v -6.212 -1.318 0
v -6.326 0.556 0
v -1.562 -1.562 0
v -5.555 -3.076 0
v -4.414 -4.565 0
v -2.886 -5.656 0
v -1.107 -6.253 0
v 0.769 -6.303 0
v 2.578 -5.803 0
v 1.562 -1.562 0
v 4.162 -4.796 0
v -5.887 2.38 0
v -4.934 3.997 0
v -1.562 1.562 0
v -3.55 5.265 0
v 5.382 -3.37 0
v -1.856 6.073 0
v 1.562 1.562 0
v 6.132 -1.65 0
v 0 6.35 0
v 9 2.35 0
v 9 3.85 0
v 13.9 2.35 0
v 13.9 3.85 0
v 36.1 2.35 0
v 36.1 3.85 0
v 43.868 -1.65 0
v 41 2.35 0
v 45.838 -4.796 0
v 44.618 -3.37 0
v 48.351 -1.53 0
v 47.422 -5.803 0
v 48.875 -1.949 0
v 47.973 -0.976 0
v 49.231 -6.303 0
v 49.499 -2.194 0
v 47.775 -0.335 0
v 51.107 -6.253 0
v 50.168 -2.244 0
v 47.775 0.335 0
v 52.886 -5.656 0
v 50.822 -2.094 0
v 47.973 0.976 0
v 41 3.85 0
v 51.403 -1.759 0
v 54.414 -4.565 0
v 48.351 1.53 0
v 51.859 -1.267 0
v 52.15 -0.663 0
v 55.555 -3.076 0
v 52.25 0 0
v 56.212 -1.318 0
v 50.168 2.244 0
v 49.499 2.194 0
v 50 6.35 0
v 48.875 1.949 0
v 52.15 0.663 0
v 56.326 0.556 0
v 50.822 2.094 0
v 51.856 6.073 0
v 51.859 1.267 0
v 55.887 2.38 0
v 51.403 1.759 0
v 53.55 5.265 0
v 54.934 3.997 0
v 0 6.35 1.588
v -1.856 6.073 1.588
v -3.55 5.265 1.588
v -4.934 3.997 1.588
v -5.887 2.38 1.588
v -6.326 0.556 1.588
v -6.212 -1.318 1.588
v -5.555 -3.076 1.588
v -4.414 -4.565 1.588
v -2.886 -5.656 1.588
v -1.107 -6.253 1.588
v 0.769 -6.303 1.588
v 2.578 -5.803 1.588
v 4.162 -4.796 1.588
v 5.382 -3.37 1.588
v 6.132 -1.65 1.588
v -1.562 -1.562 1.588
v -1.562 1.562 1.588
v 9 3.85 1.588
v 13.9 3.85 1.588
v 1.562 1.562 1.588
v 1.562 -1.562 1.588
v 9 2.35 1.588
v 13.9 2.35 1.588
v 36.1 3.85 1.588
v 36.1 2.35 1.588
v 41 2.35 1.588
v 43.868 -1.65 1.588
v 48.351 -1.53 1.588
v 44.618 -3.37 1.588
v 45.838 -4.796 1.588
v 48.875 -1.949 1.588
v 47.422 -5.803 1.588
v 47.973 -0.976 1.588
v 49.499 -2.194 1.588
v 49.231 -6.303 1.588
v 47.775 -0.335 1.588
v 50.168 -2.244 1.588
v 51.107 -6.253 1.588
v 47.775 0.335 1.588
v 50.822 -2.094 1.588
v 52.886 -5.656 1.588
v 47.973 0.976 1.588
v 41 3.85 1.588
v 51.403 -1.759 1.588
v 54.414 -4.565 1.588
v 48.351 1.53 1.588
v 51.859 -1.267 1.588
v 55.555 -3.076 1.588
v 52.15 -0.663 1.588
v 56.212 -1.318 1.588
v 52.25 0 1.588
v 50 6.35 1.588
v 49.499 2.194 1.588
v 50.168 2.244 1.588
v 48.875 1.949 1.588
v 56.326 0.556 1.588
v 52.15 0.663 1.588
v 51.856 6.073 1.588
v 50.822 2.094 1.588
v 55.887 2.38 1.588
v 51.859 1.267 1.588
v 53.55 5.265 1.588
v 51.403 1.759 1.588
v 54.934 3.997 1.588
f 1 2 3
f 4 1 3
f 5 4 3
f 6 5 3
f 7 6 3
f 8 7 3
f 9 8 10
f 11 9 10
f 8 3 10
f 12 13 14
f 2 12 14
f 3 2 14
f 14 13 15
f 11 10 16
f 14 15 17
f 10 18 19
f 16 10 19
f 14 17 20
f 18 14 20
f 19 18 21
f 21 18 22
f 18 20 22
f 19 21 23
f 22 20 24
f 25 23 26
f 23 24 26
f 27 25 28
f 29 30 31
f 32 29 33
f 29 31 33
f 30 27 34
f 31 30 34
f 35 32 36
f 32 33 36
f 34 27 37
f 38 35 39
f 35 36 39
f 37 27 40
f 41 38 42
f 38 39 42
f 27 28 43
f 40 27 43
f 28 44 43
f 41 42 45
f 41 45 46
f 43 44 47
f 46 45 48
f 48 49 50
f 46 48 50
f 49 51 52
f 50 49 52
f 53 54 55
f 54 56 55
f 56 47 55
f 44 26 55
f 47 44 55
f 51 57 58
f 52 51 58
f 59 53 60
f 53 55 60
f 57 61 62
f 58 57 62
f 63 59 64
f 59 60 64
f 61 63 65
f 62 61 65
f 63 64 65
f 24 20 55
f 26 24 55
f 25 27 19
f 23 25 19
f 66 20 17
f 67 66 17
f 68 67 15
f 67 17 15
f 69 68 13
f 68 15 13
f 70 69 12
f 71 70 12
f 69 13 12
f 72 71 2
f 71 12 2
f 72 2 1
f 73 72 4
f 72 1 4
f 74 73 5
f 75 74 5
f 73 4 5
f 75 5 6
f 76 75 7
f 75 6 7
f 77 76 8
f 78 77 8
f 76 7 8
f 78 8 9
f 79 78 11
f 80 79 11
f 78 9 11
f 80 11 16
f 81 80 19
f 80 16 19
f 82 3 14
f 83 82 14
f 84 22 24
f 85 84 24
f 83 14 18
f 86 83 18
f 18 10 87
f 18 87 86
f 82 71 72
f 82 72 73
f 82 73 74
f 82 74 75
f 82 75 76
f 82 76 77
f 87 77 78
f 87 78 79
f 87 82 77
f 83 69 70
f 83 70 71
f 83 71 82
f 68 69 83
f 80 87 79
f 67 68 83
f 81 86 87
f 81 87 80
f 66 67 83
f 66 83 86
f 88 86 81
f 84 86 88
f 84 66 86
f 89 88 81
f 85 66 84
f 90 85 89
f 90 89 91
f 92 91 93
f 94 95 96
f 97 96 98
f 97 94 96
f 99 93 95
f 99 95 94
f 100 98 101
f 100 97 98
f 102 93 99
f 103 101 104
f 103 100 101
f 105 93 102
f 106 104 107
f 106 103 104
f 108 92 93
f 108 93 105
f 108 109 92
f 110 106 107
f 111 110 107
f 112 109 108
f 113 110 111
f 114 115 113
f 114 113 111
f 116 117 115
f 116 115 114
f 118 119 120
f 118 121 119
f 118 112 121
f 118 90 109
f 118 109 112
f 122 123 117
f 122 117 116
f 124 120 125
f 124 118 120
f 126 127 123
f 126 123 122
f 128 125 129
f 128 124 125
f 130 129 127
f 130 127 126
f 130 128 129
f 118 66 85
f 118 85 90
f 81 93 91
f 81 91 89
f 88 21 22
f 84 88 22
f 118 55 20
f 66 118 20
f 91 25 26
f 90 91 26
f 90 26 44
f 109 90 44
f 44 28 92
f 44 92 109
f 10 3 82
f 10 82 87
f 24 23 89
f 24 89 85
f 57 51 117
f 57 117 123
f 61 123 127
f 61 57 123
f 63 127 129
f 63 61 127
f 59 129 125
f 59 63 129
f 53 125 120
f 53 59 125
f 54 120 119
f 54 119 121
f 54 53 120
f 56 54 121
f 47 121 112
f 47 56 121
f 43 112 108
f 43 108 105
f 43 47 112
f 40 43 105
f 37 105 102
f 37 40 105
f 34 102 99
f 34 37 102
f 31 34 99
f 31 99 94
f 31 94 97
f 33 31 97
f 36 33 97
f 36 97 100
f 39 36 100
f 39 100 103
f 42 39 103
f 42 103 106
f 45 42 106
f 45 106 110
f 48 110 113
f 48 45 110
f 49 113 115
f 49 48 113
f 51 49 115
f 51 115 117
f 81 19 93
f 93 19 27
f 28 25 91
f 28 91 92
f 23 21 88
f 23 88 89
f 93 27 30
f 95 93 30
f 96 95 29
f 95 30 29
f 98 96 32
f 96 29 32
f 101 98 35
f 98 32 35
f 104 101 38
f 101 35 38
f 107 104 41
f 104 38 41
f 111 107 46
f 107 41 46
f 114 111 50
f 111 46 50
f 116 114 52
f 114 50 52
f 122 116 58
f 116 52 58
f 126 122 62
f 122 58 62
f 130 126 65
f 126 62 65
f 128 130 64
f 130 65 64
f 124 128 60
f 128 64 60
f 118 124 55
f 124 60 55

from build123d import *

# Parameters (mm, degrees)
SKETCH1_W           = 4.9
SKETCH1_H           = 1.5
SKETCH1_R           = 6.35
SKETCH1_W_2         = 3.125
SKETCH1_H_2         = 3.125
SKETCH1_R_2         = 2.25
BOSS_EXTRUDE1_DEPTH = 1.5875


with BuildPart() as part:
    # Sketch1 → Boss-Extrude1 (new body)
    # profile 1 of 3: a face of its own
    with BuildSketch(Plane.XY):
        with BuildLine():
            Line((50, 6.35), (0, 6.35))
            ThreePointArc((0, 6.35), (4.490128061, 4.490128061), (6.35, 0))
            ThreePointArc((6.35, 0), (6.295234812, -0.83217706), (6.131883887, -1.65))
            Line((6.131883887, -1.65), (43.868116113, -1.65))
            ThreePointArc((43.868116113, -1.65), (44.960158733, 3.862965182), (50, 6.35))
        make_face()
        with Locations((11.45, 3.1)):
            Rectangle(SKETCH1_W, SKETCH1_H, mode=Mode.SUBTRACT)
        with Locations((38.55, 3.1)):
            Rectangle(SKETCH1_W, SKETCH1_H, mode=Mode.SUBTRACT)
    # profile 2 of 3: a face of its own
    with BuildSketch(Plane.XY):
        Circle(SKETCH1_R)
        Rectangle(SKETCH1_W_2, SKETCH1_H_2, mode=Mode.SUBTRACT)
    # profile 3 of 3: a face of its own
    with BuildSketch(Plane.XY):
        with Locations((50, 0)):
            Circle(SKETCH1_R)
        with Locations((50, 0)):
            Circle(SKETCH1_R_2, mode=Mode.SUBTRACT)
    extrude(amount=BOSS_EXTRUDE1_DEPTH)


solid = part.part
